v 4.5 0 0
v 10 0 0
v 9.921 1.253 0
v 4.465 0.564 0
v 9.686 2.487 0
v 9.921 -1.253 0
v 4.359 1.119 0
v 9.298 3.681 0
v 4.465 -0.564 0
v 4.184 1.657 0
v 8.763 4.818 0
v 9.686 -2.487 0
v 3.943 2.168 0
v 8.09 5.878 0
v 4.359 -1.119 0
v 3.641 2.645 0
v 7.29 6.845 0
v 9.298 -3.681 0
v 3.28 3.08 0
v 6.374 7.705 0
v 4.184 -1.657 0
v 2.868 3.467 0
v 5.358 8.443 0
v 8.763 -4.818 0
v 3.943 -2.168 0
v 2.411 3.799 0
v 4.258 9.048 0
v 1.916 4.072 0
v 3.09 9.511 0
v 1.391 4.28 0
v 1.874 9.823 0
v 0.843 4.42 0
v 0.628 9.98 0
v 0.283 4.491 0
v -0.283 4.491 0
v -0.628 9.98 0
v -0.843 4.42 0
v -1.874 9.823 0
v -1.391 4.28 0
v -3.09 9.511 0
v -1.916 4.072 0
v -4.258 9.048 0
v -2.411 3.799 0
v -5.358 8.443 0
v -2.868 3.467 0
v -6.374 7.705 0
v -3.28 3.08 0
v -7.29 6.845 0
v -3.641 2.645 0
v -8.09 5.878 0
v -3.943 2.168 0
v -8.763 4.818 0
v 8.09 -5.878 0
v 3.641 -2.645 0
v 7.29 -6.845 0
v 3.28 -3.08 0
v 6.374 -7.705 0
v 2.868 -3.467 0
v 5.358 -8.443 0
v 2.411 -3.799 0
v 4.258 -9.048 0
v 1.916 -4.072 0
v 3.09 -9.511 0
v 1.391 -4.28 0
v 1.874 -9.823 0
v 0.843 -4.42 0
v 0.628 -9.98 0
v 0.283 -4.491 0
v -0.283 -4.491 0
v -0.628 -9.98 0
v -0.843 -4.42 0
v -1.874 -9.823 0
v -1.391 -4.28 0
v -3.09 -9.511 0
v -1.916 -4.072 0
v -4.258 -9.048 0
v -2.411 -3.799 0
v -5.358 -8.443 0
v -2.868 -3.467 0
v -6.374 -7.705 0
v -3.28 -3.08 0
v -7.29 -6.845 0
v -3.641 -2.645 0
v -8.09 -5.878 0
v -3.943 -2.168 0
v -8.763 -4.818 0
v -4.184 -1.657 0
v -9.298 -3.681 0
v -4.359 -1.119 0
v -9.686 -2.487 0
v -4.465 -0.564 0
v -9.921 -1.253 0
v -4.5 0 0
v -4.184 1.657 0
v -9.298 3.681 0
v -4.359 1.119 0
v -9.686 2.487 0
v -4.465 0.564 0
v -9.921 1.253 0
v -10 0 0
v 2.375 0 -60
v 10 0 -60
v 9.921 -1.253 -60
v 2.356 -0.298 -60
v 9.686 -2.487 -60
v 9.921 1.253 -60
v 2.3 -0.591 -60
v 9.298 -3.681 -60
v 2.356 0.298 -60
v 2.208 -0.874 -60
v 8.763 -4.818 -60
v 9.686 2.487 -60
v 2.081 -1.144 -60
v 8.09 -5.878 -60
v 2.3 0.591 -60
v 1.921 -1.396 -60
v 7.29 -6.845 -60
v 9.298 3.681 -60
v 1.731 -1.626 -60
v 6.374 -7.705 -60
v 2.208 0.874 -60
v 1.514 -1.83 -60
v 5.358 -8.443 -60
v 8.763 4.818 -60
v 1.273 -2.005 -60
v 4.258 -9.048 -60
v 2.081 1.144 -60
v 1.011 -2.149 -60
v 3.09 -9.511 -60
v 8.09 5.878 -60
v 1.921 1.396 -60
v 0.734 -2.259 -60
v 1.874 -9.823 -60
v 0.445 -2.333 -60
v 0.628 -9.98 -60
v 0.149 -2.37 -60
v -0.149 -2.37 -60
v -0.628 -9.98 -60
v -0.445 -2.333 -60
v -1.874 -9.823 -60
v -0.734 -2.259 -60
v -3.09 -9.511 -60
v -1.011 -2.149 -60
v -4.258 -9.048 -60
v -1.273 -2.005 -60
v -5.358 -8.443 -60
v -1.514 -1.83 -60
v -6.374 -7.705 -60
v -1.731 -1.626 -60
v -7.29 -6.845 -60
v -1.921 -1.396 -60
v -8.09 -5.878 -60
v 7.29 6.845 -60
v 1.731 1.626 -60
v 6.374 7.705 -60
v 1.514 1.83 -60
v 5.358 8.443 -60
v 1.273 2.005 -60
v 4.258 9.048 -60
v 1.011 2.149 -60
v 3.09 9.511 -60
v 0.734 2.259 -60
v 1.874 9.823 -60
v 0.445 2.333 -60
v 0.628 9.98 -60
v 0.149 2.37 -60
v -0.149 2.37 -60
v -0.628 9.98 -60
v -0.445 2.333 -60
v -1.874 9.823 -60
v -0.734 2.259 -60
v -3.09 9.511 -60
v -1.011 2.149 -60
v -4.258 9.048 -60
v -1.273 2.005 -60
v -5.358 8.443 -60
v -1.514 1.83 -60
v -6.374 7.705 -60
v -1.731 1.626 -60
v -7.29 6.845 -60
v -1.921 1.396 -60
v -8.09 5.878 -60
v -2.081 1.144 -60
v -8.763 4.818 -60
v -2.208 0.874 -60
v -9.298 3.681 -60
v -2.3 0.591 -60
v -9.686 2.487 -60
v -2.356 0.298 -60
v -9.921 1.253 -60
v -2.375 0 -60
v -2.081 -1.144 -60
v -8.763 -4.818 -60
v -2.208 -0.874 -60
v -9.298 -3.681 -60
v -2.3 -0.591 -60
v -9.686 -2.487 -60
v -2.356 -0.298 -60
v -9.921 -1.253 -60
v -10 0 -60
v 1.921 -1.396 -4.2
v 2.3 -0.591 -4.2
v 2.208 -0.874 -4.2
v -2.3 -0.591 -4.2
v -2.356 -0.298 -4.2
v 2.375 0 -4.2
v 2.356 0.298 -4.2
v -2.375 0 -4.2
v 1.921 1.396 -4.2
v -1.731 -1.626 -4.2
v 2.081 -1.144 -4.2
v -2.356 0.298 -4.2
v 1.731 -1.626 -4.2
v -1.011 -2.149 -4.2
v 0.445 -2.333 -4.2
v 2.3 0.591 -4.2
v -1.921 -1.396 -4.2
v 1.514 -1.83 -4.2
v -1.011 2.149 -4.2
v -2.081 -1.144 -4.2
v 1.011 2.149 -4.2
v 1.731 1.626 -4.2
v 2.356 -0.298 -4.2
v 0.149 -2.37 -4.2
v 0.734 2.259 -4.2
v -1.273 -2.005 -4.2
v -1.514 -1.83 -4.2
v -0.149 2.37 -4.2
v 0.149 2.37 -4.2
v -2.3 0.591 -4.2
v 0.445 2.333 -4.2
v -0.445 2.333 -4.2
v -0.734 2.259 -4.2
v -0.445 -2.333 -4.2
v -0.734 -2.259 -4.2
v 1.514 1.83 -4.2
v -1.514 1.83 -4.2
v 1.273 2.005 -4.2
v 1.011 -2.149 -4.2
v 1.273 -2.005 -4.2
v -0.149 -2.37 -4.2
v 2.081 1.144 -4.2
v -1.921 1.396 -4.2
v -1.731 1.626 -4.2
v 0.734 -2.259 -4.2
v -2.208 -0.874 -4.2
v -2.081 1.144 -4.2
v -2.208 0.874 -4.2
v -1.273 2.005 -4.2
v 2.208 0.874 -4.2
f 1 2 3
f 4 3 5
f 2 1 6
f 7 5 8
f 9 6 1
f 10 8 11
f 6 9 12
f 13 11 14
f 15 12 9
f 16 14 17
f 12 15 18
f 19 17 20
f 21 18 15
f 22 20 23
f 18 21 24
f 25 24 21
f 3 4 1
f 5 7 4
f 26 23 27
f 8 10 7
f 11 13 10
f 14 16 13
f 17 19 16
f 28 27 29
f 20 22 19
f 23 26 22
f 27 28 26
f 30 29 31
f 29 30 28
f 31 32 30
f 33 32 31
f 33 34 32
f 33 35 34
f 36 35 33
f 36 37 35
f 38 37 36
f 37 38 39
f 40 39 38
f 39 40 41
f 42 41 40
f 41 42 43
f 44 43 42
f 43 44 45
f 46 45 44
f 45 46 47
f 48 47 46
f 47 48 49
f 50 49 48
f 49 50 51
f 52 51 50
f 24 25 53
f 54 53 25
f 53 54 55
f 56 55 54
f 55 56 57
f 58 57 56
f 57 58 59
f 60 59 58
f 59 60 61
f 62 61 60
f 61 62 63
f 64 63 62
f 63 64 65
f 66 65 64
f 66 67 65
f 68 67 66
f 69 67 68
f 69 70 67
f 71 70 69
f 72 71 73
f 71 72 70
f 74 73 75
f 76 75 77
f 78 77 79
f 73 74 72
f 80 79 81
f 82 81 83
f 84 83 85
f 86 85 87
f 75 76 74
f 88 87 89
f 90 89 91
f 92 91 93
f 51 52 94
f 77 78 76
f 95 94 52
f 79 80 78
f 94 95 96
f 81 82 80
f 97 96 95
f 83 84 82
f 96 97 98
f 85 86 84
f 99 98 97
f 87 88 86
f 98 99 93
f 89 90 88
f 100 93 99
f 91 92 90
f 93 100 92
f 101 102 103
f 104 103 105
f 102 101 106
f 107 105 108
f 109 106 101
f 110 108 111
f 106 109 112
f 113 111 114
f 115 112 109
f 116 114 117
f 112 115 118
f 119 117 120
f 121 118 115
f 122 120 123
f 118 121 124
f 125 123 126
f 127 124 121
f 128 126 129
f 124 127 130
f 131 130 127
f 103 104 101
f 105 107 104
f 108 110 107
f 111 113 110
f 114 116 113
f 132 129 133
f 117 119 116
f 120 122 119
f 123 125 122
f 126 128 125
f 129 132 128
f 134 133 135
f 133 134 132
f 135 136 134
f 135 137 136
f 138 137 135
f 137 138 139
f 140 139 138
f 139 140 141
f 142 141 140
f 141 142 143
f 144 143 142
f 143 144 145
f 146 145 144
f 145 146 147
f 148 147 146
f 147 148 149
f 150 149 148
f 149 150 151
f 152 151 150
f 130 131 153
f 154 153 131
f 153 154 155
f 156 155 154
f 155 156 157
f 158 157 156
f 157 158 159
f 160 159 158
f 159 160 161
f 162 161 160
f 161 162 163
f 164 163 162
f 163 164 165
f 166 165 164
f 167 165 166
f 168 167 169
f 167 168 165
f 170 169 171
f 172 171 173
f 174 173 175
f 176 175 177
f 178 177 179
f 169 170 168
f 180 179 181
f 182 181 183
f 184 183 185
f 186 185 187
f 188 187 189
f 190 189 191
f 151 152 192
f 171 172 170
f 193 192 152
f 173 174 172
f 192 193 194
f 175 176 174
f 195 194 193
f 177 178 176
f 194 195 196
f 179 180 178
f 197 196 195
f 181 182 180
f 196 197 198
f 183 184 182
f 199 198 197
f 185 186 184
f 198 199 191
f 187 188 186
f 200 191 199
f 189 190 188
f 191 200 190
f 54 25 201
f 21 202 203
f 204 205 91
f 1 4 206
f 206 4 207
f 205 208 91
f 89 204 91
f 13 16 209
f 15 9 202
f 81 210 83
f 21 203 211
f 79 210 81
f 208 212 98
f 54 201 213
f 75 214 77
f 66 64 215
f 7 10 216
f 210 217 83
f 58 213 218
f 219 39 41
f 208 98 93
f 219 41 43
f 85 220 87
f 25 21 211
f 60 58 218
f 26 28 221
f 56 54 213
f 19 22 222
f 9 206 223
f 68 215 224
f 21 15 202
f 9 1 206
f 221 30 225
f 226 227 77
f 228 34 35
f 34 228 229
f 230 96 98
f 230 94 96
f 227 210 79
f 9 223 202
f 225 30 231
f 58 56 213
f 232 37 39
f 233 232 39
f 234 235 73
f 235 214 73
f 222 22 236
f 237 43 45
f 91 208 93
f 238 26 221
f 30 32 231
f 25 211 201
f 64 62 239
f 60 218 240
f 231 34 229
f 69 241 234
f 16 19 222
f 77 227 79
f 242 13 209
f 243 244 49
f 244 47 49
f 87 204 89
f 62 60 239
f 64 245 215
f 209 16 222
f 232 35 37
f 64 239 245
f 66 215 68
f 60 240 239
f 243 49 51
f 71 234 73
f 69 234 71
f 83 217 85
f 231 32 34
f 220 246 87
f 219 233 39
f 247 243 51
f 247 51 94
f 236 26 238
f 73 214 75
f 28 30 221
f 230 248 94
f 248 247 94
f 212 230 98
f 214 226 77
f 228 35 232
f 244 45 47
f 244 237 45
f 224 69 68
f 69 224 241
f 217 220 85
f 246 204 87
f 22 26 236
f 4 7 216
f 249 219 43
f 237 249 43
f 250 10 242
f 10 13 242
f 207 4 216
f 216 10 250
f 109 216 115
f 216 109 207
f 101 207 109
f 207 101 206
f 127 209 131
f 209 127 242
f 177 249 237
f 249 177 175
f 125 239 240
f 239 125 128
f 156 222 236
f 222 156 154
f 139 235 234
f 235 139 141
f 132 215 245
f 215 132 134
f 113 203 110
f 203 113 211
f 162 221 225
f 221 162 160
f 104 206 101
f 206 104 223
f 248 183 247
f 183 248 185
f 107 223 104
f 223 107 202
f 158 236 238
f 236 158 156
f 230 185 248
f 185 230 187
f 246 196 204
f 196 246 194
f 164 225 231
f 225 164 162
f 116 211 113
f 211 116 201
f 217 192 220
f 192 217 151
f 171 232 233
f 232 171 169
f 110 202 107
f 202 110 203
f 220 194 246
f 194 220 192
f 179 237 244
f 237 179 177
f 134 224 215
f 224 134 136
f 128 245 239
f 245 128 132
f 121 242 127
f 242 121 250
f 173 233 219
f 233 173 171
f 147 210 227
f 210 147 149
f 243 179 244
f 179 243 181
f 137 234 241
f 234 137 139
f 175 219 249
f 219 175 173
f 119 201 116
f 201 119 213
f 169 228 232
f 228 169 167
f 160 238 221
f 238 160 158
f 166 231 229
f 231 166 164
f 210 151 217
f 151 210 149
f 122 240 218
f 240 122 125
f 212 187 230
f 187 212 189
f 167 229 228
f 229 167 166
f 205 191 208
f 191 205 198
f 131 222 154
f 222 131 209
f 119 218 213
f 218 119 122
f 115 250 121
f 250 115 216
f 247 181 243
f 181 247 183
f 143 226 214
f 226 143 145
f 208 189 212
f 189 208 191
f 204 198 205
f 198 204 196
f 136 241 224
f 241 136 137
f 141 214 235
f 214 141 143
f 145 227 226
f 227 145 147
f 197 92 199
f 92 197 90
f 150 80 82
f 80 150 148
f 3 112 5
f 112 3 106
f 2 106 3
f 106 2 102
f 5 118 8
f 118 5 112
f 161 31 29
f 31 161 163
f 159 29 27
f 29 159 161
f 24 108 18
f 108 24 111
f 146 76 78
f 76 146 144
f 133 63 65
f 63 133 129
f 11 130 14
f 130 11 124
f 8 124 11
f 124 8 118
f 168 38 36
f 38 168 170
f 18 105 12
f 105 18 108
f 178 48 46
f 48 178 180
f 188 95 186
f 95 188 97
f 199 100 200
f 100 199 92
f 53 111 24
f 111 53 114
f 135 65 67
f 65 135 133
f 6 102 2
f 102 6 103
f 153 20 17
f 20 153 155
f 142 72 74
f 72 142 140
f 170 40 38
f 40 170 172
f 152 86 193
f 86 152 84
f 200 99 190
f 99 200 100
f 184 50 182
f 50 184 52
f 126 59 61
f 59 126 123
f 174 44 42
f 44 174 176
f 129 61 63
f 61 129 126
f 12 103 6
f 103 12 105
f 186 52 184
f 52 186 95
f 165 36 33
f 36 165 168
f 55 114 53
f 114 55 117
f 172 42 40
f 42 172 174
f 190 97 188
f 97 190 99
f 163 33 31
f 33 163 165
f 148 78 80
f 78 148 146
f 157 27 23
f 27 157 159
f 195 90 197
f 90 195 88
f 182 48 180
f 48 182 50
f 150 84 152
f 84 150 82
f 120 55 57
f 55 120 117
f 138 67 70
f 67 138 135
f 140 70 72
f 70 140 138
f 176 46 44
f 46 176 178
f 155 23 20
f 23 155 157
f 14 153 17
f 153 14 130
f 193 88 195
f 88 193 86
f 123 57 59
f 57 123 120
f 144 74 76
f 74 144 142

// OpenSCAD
$fn = 50;


difference() {
	union() {
		translate(v = [0, 0, -60.0000000000]) {
			cylinder(h = 60, r = 10.0000000000);
		}
	}
	union() {
		translate(v = [0, 0, 0]) {
			rotate(a = [0, 0, 0]) {
				difference() {
					union() {
						#translate(v = [0, 0, -60.0000000000]) {
							cylinder(h = 60, r = 2.2500000000);
						}
						#translate(v = [0, 0, -4.2000000000]) {
							cylinder(h = 4.2000000000, r1 = 2.3750000000, r2 = 4.5000000000);
						}
						#translate(v = [0, 0, -60.0000000000]) {
							cylinder(h = 60, r = 2.3750000000);
						}
						#translate(v = [0, 0, -60.0000000000]) {
							cylinder(h = 60, r = 2.2500000000);
						}
					}
					union();
				}
			}
		}
	}
}
